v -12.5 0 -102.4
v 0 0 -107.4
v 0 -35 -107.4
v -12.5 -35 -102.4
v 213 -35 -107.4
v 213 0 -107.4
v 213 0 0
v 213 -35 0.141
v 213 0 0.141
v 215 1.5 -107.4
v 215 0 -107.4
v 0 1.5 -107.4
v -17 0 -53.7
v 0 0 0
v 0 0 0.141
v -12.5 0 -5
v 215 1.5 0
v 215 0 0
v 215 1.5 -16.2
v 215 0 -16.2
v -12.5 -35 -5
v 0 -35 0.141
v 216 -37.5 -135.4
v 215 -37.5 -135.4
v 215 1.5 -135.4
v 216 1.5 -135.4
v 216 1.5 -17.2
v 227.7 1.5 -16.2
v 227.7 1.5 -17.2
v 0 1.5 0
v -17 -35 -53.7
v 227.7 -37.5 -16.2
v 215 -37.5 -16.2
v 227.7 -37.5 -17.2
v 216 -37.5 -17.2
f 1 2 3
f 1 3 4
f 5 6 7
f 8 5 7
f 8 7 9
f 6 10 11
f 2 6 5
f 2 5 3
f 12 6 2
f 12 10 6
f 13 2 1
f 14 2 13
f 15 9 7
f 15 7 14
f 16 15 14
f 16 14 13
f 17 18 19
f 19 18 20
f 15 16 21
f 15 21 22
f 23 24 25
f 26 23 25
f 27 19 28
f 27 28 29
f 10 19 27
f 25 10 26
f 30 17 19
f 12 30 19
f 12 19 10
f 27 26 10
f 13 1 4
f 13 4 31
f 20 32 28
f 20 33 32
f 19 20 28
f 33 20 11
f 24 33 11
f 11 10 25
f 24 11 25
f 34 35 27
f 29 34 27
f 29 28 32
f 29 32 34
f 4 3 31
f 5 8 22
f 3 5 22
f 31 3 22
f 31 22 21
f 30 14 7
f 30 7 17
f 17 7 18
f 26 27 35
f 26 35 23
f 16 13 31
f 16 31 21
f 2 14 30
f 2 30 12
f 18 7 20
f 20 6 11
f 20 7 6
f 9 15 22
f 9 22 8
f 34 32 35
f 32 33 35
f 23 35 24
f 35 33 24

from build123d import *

# Parameters (mm, degrees)
CARD_W              = 215
CARD_H              = 107.4
BOSS_EXTRUDE1_DEPTH = 1.5
SKETCH2_W           = 119.2
SKETCH2_H           = 39
BOSS_EXTRUDE2_DEPTH = 1
SKETCH3_W           = 1
SKETCH3_H           = 39
BOSS_EXTRUDE3_DEPTH = 11.7
BOSS_EXTRUDE4_DEPTH = 35


with BuildPart() as part:
    # card → Boss-Extrude1 (new body)
    with BuildSketch(Plane(origin=(0, 0, 0), x_dir=(1, 0, 0), z_dir=(0, 1, 0))):
        with Locations((107.5, 53.7)):
            Rectangle(CARD_W, CARD_H)
    extrude(amount=BOSS_EXTRUDE1_DEPTH)

    # Sketch2 → Boss-Extrude2 (add)
    with BuildSketch(Plane(origin=(215, 0, 0), x_dir=(0, 0, -1), z_dir=(1, 0, 0))):
        with Locations((75.8, -18)):
            Rectangle(SKETCH2_W, SKETCH2_H)
    extrude(amount=BOSS_EXTRUDE2_DEPTH)

    # Sketch3 → Boss-Extrude3 (add)
    with BuildSketch(Plane(origin=(216, 0, 0), x_dir=(0, 0, -1), z_dir=(1, 0, 0))):
        with Locations((16.7, -18)):
            Rectangle(SKETCH3_W, SKETCH3_H)
    extrude(amount=BOSS_EXTRUDE3_DEPTH)

    # Sketch5 → Boss-Extrude4 (add)
    with BuildSketch(Plane.XZ):
        Polygon((213, 0), (213, -107.4), (0, -107.4), (-12.5, -102.4), (-17, -53.7), (-12.5, -5), (0, 0.14109814), (213, 0.14109814), align=None)
    extrude(amount=BOSS_EXTRUDE4_DEPTH)


solid = part.part
